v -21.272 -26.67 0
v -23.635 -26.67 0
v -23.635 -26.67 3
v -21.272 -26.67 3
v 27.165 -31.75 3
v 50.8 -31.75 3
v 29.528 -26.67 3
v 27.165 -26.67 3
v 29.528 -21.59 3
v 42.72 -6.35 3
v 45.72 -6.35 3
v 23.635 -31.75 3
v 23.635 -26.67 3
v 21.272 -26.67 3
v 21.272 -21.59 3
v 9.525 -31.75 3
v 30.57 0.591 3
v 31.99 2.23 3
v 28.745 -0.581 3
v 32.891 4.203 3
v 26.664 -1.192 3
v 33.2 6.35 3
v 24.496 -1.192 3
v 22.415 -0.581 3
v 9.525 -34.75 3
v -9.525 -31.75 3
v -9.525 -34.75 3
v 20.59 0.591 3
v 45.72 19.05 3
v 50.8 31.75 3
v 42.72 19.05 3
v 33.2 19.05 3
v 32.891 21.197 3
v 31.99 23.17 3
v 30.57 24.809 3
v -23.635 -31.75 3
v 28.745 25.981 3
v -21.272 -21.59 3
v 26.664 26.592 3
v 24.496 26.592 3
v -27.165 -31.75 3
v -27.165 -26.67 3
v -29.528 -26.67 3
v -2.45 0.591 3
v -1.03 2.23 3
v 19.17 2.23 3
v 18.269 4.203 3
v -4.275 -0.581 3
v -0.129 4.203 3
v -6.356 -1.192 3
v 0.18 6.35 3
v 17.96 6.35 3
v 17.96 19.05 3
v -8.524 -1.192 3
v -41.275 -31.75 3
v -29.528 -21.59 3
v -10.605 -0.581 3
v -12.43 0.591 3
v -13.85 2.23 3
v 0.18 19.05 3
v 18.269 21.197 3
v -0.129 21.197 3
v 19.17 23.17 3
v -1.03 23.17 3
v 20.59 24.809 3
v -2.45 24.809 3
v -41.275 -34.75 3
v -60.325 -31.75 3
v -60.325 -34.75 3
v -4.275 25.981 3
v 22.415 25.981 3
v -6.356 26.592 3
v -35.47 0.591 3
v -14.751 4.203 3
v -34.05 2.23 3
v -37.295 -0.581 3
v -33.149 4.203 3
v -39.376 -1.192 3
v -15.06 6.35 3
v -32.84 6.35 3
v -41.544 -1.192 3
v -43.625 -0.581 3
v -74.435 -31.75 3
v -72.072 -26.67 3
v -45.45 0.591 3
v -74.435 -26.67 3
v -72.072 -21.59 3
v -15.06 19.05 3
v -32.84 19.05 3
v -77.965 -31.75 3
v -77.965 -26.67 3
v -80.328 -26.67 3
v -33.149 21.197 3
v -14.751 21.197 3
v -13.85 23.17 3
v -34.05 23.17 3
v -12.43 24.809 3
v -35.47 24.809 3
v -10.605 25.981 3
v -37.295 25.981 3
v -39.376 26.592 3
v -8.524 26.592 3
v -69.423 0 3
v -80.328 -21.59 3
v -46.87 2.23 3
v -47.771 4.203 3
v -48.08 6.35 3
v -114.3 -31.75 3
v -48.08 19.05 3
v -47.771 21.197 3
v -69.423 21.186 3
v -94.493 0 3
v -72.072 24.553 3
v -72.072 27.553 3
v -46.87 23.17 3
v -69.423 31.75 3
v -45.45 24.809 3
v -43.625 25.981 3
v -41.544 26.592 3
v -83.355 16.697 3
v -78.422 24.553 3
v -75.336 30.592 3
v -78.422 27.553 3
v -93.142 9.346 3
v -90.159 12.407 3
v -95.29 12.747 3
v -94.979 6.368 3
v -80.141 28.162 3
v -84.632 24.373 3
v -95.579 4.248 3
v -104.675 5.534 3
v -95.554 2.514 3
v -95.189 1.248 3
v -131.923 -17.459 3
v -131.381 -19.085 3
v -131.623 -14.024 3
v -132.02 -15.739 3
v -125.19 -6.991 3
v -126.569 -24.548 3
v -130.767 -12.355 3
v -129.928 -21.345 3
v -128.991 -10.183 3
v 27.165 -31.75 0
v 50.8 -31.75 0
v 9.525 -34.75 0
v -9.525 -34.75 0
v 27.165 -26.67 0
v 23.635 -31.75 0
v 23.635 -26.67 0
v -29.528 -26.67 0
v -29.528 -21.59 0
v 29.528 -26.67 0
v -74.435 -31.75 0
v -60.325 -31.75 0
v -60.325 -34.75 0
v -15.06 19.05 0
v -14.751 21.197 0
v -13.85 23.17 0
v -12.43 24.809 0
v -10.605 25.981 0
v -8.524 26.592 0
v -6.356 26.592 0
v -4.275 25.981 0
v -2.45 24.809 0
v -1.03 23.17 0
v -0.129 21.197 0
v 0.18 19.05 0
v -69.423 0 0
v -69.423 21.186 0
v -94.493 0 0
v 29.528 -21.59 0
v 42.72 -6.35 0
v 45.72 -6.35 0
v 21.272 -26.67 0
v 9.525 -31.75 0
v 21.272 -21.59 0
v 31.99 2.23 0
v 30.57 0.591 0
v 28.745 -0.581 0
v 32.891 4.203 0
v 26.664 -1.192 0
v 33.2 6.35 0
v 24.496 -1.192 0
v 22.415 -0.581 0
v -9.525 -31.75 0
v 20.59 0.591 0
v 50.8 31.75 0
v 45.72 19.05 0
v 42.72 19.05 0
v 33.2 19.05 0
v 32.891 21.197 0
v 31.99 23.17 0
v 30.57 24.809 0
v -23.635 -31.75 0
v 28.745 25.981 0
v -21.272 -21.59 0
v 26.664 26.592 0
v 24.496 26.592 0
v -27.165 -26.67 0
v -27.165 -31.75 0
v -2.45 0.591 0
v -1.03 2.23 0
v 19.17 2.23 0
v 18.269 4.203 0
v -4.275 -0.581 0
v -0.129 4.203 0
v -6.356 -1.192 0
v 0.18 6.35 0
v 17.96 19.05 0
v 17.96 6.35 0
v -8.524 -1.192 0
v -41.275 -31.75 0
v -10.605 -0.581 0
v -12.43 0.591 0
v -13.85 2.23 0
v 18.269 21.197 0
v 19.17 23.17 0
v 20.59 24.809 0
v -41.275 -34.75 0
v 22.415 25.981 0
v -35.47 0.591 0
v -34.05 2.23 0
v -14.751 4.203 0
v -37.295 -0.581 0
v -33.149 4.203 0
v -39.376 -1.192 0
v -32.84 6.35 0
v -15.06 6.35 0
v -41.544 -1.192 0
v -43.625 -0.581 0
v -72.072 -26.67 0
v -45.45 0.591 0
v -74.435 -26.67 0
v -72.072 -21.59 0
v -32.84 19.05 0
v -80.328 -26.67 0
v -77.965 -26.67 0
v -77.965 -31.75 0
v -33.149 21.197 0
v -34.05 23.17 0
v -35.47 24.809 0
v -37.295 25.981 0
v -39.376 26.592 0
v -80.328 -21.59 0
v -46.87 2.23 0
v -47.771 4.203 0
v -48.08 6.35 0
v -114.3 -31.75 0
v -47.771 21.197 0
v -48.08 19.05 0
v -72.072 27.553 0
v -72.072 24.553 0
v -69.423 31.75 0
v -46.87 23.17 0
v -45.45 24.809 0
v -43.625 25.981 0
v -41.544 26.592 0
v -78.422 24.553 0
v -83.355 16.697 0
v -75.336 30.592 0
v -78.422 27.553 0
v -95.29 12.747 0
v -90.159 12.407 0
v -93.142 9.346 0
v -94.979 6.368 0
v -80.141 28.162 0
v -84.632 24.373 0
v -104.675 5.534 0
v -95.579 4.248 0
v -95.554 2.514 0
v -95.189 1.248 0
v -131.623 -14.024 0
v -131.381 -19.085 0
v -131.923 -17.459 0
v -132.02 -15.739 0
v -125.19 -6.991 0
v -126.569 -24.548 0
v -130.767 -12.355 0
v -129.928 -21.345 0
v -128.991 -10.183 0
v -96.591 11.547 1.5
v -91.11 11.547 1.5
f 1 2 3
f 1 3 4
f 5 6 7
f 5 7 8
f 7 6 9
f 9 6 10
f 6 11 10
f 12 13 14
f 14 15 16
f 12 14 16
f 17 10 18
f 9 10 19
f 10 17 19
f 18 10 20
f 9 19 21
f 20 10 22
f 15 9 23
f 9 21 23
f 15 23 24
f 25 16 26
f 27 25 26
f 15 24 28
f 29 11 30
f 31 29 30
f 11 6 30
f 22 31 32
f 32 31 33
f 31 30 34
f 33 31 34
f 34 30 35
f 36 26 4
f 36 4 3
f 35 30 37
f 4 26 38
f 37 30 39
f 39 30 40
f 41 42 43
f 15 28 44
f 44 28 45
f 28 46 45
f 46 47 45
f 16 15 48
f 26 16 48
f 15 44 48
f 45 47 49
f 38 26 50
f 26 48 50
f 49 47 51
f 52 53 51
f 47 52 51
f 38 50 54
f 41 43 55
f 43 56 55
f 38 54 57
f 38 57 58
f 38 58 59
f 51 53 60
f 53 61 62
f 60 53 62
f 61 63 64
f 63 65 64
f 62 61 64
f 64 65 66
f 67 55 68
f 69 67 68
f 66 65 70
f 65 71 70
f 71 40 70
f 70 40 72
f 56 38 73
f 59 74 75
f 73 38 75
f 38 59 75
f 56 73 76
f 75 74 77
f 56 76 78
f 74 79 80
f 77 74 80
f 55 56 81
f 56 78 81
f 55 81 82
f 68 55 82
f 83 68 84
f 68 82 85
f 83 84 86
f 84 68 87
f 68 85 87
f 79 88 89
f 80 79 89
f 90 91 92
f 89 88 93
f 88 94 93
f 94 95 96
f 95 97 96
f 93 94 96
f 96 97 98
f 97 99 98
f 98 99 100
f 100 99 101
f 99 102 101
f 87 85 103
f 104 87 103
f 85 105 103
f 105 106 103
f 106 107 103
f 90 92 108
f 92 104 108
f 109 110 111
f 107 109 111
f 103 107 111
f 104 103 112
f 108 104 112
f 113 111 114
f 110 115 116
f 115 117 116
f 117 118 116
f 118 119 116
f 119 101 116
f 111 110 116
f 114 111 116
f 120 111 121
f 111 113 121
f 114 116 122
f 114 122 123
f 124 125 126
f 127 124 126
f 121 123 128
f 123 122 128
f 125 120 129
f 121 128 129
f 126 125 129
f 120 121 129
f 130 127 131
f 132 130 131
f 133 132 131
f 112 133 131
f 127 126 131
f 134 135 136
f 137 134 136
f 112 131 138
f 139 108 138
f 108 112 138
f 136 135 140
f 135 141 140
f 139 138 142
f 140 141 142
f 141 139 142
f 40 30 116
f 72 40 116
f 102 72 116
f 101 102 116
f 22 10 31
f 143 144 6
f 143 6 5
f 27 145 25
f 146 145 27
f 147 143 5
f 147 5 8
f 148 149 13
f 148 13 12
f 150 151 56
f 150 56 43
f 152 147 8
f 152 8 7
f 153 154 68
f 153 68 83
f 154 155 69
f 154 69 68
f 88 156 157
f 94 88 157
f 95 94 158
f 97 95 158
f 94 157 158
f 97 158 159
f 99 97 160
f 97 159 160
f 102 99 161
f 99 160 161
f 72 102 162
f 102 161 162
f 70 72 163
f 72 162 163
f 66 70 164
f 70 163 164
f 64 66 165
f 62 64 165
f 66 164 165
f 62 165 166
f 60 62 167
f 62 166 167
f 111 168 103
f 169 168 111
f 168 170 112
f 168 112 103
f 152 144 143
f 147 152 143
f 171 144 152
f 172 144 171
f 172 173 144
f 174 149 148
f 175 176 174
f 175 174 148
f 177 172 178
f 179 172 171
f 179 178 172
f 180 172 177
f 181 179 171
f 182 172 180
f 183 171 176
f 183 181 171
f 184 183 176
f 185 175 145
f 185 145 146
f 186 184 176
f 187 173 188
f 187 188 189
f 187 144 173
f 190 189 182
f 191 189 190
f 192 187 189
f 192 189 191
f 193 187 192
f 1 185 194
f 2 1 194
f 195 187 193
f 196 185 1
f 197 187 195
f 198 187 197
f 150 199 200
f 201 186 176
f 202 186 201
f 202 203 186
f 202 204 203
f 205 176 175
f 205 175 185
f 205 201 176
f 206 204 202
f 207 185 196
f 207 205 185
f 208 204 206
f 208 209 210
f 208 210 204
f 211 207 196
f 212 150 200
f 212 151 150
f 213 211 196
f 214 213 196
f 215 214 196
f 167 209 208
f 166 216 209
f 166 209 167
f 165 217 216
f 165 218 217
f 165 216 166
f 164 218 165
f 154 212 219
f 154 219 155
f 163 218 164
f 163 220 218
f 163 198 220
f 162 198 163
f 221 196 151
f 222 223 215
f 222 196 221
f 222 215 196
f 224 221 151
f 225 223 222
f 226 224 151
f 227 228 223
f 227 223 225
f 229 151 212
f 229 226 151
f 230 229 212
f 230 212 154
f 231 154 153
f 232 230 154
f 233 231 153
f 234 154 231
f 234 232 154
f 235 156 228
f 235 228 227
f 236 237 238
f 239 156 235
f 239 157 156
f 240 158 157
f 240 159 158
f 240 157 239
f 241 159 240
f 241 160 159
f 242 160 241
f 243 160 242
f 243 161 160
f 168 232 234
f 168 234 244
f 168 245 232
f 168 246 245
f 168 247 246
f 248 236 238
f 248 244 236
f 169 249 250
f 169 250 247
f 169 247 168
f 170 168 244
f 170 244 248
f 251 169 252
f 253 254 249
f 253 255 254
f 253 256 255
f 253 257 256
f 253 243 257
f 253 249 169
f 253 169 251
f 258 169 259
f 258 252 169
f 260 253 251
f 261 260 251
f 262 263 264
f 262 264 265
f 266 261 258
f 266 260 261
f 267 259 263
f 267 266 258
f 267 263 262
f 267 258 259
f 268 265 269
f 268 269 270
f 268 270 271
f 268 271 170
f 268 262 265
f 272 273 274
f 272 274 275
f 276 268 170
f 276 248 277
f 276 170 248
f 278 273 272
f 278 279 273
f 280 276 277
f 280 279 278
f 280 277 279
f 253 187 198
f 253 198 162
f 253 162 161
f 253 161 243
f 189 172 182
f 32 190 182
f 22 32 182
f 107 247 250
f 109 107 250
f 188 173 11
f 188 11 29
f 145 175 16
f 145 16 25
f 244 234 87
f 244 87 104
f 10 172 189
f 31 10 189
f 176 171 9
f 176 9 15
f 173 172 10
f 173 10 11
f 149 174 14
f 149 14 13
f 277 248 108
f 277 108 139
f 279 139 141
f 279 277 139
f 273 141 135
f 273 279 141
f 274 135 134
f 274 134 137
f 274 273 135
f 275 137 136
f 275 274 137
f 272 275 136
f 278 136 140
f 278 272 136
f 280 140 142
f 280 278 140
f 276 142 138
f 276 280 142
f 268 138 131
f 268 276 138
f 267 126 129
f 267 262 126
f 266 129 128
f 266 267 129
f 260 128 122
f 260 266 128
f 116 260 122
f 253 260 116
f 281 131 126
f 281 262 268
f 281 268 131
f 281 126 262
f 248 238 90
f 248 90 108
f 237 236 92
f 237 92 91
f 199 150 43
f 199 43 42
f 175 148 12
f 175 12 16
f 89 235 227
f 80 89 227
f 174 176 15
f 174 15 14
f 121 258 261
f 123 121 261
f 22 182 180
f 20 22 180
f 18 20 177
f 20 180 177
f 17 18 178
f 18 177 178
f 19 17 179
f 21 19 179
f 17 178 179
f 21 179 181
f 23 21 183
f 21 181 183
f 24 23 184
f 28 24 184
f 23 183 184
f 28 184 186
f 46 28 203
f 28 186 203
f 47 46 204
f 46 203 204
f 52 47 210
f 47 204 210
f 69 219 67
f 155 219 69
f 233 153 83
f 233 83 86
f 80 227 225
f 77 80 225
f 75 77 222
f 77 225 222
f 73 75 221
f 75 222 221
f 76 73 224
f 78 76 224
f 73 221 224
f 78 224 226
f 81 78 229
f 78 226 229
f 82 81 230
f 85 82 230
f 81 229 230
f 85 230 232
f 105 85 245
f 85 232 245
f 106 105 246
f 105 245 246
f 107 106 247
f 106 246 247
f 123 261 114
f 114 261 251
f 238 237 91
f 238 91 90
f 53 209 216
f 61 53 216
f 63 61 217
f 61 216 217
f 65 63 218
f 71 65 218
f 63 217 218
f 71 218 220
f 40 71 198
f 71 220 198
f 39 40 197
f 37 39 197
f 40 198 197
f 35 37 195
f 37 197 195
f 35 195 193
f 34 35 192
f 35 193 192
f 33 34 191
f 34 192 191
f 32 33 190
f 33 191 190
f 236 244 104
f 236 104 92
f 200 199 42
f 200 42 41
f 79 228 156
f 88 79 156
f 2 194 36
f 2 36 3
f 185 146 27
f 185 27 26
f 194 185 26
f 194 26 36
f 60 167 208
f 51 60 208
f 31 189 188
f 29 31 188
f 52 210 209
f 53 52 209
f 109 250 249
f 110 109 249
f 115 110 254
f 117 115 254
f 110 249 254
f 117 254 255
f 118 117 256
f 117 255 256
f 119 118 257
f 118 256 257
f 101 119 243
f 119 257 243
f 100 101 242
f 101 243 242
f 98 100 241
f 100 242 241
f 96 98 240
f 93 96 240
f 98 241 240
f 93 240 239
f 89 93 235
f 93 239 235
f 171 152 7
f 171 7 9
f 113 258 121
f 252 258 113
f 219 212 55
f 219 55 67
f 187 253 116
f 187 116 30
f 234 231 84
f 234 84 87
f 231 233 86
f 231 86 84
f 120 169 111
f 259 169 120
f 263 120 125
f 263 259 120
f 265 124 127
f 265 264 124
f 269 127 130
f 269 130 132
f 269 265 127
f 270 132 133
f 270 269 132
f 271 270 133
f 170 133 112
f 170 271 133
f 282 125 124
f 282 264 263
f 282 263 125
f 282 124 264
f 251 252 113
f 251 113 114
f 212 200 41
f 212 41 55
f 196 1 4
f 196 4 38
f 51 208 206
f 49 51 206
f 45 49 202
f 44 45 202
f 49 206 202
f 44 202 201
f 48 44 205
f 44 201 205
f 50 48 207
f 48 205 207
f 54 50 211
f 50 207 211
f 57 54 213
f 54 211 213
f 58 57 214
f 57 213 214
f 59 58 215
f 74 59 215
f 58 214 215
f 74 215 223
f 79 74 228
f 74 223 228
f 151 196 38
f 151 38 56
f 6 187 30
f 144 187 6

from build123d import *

# Parameters (mm, degrees)
SKETCH1_W           = 3
SKETCH1_H           = 25.4
SKETCH1_W_2         = 6.35
SKETCH1_H_2         = 3
BOSS_EXTRUDE1_DEPTH = 3


with BuildPart() as part:
    # Sketch1 → Boss-Extrude1 (new body)
    with BuildSketch(Plane.XY):
        with BuildLine():
            Line((-69.423123959, 31.75), (50.8, 31.75))
            Line((50.8, 31.75), (50.8, -31.75))
            Line((50.8, -31.75), (27.1653, -31.75))
            Line((27.1653, -31.75), (27.1653, -26.67))
            Line((27.1653, -26.67), (29.5275, -26.67))
            Line((29.5275, -26.67), (29.5275, -21.59))
            Line((29.5275, -21.59), (21.2725, -21.59))
            Line((21.2725, -21.59), (21.2725, -26.67))
            Line((21.2725, -26.67), (23.6347, -26.67))
            Line((23.6347, -26.67), (23.6347, -31.75))
            Line((23.6347, -31.75), (9.525, -31.75))
            Line((9.525, -31.75), (9.525, -34.75))
            Line((9.525, -34.75), (-9.525, -34.75))
            Line((-9.525, -34.75), (-9.525, -31.75))
            Line((-9.525, -31.75), (-23.6347, -31.75))
            Line((-23.6347, -31.75), (-23.6347, -26.67))
            Line((-23.6347, -26.67), (-21.2725, -26.67))
            Line((-21.2725, -26.67), (-21.2725, -21.59))
            Line((-21.2725, -21.59), (-29.5275, -21.59))
            Line((-29.5275, -21.59), (-29.5275, -26.67))
            Line((-29.5275, -26.67), (-27.1653, -26.67))
            Line((-27.1653, -26.67), (-27.1653, -31.75))
            Line((-27.1653, -31.75), (-41.275, -31.75))
            Line((-41.275, -31.75), (-41.275, -34.75))
            Line((-41.275, -34.75), (-60.325, -34.75))
            Line((-60.325, -34.75), (-60.325, -31.75))
            Line((-60.325, -31.75), (-74.4347, -31.75))
            Line((-74.4347, -31.75), (-74.4347, -26.67))
            Line((-74.4347, -26.67), (-72.0725, -26.67))
            Line((-72.0725, -26.67), (-72.0725, -21.59))
            Line((-72.0725, -21.59), (-80.3275, -21.59))
            Line((-80.3275, -21.59), (-80.3275, -26.67))
            Line((-80.3275, -26.67), (-77.9653, -26.67))
            Line((-77.9653, -26.67), (-77.9653, -31.75))
            Line((-77.9653, -31.75), (-114.3, -31.75))
            add(Edge.make_bspline(
                [(-114.3, -31.75), (-155.075216818, -12.249007941), (-95.203771035, -1.48614813), (-82.940088204, 30.901814597), (-69.423123959, 31.75)],
                knots=[0, 0, 0, 0, 0.663381838, 1, 1, 1, 1], degree=3))
        make_face()
        with BuildLine():
            Line((33.200035124, 19.05), (33.200035124, 6.35))
            ThreePointArc((33.200035124, 6.35), (25.580035124, -1.27), (17.960035124, 6.35))
            Line((17.960035124, 6.35), (17.960035124, 19.05))
            ThreePointArc((17.960035124, 19.05), (25.580035124, 26.67), (33.200035124, 19.05))
        make_face(mode=Mode.SUBTRACT)
        with BuildLine():
            Line((-69.423123959, 0), (-69.423123959, 21.185554356))
            add(Edge.make_bspline(
                [(-69.423123959, 21.185554356), (-77.065116074, 19.019259029), (-89.179513015, 16.560411812), (-97.292708494, 3.952124557), (-94.492767951, 0)],
                knots=[0, 0, 0, 0, 0.649291819, 1, 1, 1, 1], degree=3))
            Line((-94.492767951, 0), (-69.423123959, 0))
        make_face(mode=Mode.SUBTRACT)
        with BuildLine():
            Line((0.180035124, 19.05), (0.180035124, 6.35))
            ThreePointArc((0.180035124, 6.35), (-7.439964876, -1.27), (-15.059964876, 6.35))
            Line((-15.059964876, 6.35), (-15.059964876, 19.05))
            ThreePointArc((-15.059964876, 19.05), (-7.439964876, 26.67), (0.180035124, 19.05))
        make_face(mode=Mode.SUBTRACT)
        with BuildLine():
            Line((-32.839964876, 19.05), (-32.839964876, 6.35))
            ThreePointArc((-32.839964876, 6.35), (-40.459964876, -1.27), (-48.079964876, 6.35))
            Line((-48.079964876, 6.35), (-48.079964876, 19.05))
            ThreePointArc((-48.079964876, 19.05), (-40.459964876, 26.67), (-32.839964876, 19.05))
        make_face(mode=Mode.SUBTRACT)
        with Locations((44.22, 6.35)):
            Rectangle(SKETCH1_W, SKETCH1_H, mode=Mode.SUBTRACT)
        with Locations((-75.2475, 26.052973764)):
            Rectangle(SKETCH1_W_2, SKETCH1_H_2, mode=Mode.SUBTRACT)
    extrude(amount=BOSS_EXTRUDE1_DEPTH)


solid = part.part
